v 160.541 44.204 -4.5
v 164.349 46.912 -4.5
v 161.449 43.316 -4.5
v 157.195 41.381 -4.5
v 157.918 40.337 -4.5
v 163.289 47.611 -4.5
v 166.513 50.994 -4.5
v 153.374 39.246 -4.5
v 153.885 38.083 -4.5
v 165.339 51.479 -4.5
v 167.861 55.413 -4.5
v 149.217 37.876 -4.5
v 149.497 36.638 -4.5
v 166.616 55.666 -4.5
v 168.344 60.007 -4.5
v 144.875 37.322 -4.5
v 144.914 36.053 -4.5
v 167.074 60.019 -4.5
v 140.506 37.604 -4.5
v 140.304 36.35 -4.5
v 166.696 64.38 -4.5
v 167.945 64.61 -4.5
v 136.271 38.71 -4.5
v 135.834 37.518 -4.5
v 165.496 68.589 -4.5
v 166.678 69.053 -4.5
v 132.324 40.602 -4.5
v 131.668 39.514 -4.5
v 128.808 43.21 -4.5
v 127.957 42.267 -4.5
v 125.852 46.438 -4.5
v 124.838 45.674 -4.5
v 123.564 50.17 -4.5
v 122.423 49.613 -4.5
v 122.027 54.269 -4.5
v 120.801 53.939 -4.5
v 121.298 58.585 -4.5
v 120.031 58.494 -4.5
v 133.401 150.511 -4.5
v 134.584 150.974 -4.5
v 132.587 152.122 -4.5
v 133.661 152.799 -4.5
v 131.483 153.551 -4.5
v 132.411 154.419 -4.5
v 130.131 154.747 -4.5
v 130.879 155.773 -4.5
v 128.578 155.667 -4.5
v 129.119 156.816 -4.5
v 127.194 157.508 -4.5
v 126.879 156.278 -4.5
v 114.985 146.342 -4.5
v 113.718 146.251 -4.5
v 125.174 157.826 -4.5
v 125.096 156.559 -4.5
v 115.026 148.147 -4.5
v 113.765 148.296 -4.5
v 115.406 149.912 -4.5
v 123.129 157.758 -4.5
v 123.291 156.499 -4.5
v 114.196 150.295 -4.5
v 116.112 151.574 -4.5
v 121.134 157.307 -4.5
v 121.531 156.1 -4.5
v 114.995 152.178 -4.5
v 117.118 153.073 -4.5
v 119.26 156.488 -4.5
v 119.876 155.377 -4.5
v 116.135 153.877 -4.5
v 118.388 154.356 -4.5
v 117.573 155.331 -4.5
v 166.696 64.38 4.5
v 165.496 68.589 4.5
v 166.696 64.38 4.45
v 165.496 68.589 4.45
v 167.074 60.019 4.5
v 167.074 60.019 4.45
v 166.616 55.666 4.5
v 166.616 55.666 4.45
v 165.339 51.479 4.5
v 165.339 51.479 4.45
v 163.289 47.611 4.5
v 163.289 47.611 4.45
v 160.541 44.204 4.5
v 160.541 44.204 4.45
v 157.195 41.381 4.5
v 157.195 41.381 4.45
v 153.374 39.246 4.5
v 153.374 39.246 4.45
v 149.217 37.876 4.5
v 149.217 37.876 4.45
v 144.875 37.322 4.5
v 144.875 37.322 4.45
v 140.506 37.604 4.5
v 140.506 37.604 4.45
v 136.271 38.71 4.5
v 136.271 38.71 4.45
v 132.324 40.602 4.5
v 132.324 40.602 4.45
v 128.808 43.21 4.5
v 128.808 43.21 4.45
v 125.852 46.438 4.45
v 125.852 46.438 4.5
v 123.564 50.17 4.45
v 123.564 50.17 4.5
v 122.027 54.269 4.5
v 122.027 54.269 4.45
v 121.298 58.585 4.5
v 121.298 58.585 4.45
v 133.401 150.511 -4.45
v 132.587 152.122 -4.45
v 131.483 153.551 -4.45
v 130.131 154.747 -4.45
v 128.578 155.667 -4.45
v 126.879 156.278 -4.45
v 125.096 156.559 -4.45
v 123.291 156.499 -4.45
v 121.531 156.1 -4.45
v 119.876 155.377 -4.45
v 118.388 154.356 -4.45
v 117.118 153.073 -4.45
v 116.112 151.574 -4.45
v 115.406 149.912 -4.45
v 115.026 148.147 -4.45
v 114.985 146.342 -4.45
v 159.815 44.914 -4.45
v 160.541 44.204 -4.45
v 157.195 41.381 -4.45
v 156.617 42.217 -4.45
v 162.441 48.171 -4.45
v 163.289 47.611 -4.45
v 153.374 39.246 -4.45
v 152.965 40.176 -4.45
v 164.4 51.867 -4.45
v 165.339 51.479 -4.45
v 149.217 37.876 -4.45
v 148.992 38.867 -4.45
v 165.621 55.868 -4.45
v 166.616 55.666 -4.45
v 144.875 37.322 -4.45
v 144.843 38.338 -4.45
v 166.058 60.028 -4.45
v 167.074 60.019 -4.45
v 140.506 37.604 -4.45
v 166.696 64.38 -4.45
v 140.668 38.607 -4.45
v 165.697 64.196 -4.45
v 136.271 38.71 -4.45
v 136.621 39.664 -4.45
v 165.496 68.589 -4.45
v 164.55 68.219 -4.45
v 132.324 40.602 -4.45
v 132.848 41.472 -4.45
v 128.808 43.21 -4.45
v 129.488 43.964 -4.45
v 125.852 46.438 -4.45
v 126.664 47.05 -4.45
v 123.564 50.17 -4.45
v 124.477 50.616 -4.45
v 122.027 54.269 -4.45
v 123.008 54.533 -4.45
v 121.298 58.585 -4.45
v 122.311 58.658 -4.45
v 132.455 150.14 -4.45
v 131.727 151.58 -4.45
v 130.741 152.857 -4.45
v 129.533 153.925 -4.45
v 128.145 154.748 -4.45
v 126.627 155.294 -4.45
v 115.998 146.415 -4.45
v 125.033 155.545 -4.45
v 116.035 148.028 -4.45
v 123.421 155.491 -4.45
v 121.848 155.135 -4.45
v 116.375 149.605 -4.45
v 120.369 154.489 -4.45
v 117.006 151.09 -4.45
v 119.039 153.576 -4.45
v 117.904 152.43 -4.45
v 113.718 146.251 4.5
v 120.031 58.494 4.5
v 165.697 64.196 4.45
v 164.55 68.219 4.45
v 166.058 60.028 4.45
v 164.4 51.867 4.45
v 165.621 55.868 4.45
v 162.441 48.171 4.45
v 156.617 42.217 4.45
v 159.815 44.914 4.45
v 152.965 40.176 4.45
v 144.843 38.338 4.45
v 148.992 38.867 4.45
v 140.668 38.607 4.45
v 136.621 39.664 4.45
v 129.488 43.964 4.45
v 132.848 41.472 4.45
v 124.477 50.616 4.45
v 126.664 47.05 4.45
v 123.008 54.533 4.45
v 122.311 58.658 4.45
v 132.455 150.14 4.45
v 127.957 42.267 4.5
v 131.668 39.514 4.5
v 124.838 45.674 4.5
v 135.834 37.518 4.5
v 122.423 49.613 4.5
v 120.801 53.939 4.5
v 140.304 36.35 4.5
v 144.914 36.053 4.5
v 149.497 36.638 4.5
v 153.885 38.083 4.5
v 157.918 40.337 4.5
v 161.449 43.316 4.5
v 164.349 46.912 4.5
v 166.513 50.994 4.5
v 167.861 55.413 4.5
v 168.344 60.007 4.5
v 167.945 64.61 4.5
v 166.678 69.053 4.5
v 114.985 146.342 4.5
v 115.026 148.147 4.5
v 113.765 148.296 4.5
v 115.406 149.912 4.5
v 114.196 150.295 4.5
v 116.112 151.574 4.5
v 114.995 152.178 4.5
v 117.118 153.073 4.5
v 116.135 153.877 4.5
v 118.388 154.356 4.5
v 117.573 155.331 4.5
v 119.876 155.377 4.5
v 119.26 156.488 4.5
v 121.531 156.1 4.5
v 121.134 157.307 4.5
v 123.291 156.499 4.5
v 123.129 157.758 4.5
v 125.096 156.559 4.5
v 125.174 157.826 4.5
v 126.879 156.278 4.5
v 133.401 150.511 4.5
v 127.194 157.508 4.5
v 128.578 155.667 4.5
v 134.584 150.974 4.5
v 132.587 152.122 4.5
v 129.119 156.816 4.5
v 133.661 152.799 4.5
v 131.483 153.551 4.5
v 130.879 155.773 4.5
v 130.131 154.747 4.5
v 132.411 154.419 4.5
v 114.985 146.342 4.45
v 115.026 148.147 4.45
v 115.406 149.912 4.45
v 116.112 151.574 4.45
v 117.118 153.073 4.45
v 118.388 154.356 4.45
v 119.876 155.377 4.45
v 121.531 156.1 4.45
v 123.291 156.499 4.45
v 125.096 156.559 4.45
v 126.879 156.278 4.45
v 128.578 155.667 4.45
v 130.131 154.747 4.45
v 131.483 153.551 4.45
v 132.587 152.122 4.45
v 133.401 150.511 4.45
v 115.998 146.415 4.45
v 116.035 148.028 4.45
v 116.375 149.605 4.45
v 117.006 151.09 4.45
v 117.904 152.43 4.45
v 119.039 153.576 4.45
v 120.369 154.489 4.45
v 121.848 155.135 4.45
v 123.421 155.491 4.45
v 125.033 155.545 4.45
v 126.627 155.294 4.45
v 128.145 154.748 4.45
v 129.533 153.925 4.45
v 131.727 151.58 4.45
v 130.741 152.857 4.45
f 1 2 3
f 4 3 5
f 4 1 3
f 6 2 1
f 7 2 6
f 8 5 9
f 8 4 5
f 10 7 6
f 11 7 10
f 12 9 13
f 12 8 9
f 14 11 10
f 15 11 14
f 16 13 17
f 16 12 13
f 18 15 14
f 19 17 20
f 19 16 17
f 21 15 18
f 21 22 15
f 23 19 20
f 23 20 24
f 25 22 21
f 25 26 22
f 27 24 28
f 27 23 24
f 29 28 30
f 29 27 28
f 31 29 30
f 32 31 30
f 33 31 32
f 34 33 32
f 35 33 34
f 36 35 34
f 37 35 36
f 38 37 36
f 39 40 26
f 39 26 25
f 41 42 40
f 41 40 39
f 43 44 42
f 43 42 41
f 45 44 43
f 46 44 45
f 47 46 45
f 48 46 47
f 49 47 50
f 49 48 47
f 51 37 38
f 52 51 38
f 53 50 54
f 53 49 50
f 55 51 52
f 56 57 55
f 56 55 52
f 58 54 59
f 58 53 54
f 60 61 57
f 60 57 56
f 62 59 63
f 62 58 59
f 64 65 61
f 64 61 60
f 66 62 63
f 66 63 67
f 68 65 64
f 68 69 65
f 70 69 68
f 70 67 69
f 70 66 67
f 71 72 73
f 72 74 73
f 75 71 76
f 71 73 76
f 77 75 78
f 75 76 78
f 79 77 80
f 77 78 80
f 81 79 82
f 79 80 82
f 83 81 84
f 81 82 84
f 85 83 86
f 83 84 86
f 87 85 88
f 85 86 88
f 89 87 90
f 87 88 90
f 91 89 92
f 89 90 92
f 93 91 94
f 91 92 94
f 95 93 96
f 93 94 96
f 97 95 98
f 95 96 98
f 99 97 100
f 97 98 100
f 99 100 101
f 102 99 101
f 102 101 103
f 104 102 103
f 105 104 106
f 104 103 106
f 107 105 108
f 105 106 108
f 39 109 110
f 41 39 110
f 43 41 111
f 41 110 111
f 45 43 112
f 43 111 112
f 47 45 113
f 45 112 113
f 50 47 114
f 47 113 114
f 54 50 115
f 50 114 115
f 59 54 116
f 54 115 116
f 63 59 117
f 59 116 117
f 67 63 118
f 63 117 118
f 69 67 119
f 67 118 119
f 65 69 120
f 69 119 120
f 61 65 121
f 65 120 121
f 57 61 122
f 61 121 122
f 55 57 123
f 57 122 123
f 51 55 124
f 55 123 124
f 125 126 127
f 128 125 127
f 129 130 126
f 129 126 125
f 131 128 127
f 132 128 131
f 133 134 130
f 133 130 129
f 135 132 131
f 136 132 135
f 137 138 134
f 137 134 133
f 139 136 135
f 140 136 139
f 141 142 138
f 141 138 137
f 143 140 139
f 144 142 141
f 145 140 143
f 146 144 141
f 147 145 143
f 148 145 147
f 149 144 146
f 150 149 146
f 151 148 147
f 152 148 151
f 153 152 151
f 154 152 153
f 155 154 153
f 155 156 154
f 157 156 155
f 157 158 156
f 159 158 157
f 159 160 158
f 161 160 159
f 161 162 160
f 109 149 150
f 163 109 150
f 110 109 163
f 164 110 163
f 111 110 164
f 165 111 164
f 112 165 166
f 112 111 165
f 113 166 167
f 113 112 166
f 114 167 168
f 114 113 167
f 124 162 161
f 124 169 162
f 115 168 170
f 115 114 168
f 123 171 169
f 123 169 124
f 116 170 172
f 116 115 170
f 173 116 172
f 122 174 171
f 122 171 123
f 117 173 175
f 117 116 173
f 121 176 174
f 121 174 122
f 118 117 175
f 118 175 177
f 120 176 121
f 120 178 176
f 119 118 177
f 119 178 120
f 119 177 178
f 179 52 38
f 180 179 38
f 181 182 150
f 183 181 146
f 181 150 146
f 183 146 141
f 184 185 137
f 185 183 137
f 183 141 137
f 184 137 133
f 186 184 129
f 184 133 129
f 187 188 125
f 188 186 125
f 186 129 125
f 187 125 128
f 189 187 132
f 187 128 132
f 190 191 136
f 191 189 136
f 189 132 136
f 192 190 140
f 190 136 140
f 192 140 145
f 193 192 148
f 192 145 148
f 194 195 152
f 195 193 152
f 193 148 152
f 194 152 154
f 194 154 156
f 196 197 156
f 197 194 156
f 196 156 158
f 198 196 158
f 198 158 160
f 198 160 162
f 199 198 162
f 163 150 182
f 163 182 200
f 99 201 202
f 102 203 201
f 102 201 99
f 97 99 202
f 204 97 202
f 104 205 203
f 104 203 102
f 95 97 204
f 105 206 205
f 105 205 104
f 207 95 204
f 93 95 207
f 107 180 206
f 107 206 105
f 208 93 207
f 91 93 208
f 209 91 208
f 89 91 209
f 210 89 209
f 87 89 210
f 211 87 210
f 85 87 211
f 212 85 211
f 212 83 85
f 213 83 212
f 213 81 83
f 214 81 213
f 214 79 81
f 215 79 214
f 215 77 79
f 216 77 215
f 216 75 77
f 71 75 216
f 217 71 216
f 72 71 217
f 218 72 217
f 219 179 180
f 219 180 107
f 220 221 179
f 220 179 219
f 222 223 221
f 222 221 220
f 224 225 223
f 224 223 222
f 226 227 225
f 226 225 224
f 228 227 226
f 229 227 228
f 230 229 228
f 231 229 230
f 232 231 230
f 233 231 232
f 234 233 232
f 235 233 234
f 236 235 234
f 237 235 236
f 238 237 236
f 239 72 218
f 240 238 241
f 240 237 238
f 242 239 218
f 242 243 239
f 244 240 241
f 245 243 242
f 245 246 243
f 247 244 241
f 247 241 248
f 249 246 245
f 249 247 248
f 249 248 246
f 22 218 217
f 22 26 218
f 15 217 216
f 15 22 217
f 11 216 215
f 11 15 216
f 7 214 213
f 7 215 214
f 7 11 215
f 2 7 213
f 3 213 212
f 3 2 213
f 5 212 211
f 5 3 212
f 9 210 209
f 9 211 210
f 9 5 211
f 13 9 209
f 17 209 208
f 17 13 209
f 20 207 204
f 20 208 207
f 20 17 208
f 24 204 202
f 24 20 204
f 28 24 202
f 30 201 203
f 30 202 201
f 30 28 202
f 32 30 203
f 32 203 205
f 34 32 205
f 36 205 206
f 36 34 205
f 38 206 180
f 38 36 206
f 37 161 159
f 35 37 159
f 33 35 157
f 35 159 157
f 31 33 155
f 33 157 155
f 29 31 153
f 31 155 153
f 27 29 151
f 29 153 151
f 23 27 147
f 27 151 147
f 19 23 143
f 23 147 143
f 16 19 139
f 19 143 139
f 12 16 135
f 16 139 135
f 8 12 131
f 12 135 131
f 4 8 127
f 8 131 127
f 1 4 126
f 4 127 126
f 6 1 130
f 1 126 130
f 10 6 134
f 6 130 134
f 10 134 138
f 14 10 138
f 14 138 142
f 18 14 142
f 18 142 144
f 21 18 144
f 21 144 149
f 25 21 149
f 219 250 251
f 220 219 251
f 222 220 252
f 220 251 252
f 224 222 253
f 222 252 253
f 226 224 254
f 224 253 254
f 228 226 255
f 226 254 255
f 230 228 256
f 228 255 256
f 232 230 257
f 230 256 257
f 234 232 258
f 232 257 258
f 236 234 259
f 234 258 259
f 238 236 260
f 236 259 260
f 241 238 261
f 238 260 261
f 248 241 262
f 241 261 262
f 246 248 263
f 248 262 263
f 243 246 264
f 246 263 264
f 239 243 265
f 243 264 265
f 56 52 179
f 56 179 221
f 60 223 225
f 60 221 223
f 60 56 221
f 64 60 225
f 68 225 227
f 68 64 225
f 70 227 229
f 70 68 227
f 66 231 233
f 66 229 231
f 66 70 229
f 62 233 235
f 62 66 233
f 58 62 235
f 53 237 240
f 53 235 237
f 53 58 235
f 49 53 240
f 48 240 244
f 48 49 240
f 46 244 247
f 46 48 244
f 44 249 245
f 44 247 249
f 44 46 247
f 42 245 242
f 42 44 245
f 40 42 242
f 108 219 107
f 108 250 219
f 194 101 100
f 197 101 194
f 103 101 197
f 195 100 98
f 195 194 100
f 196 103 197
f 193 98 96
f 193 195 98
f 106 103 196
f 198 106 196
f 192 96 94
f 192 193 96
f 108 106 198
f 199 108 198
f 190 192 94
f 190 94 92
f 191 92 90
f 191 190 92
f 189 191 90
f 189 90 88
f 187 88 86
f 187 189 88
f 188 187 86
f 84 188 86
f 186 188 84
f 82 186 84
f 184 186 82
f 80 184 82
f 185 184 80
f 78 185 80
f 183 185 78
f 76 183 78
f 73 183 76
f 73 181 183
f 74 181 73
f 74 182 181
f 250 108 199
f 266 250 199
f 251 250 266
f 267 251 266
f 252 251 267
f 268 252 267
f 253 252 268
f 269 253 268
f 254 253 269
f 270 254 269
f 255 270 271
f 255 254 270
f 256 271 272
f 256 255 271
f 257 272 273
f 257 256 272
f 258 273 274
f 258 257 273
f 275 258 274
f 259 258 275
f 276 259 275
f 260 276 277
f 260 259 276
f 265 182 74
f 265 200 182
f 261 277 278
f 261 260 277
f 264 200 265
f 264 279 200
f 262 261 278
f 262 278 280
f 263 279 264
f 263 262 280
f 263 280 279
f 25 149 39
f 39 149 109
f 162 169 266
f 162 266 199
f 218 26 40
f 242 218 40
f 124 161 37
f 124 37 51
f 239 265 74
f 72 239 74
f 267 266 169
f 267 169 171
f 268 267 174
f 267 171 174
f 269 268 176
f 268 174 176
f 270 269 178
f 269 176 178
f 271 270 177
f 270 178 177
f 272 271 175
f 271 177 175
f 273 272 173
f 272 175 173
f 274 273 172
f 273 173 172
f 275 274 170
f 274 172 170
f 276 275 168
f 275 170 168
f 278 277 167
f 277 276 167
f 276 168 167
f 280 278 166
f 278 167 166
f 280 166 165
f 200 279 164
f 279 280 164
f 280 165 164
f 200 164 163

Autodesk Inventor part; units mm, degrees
ref_plane "YZ Plane" through (0, 0, 0) normal (1, 0, 0) x (0, 1, 0)
ref_plane "XZ Plane" through (0, 0, 0) normal (0, 1, 0) x (-1, 0, 0)
ref_plane "XY Plane" through (0, 0, 0) normal (0, 0, 1) x (1, 0, 0)
sketch "Main Outline" plane through (0, 0, 0) normal (0, 0, 1) x (1, 0, 0)
  line L0 (0, 0) -> (304.8, 0) construction
  line L1 (304.8, 0) -> (304.8, 50.8) construction
  line L2 (304.8, 50.8) -> (0, 50.8) construction
  line L3 (0, 50.8) -> (0, 0) construction
  line L4 (0, 50.8) -> (0, 53.34) construction
  line L5 (0, 53.34) -> (304.8, 53.34) construction
  line L6 (304.8, 53.34) -> (304.8, 50.8) construction
  circle A0 centre (152.4, 23.8125) radius 17.4625 construction
  line L7 (152.4, 23.8125) -> (152.4, 0) construction
  circle A1 centre (152.4, 23.8125) radius 27.94 construction
  circle A2 centre (152.4, 23.8125) radius 21.59 construction
  line L8 (152.4, 23.8125) -> (144.1569, 60.2292) construction
  circle A3 centre (144.1569, 60.2292) radius 15.24 construction
  circle A4 centre (144.1569, 60.2292) radius 8.89 construction
  circle A5 centre (144.1569, 60.2292) radius 14.2875 construction
  arc A6 (163.8162, 72.0089) -> (128.198, 43.7805) centre (144.1569, 60.2292) ccw construction
  circle A7 centre (98.8106, 85.598) radius 32.258 construction
  circle A8 centre (124.5097, 147.0273) radius 32.258 construction
  circle A9 centre (174.158, 102.6533) radius 32.258 construction
  circle A10 centre (144.1569, 60.2292) radius 11.1125 construction
  circle A11 centre (152.4, 23.8125) radius 49.53 construction
  line L9 (144.1569, 60.2292) -> (124.5097, 147.0273) construction
  line L10 (144.1569, 60.2292) -> (98.8106, 85.598) construction
  line L11 (98.8106, 85.598) -> (174.158, 102.6533) construction
  line L12 (174.158, 102.6533) -> (144.1569, 60.2292) construction
  circle A12 centre (98.8106, 85.598) radius 9.5493 construction
  arc A13 (172.0498, 111.9669) -> (183.1109, 99.3313) centre (174.158, 102.6533) ccw construction
  circle A14 centre (124.5097, 147.0273) radius 9.5493 construction
  line L13 (96.7024, 94.9117) -> (172.0498, 111.9669) construction
  line L14 (183.1109, 99.3313) -> (165.6438, 52.2565) construction
  line L15 (92.161, 78.7444) -> (128.198, 43.7805) construction
  line L16 (172.0498, 111.9669) -> (174.158, 102.6533) construction
  line L17 (174.158, 102.6533) -> (183.1109, 99.3313) construction
  arc A15 (183.1109, 99.3313) -> (172.0498, 111.9669) centre (174.158, 102.6533) ccw construction
  arc A16 (165.6438, 52.2565) -> (163.8162, 72.0089) centre (144.1569, 60.2292) ccw construction
  arc A17 (128.198, 43.7805) -> (165.6438, 52.2565) centre (144.1569, 60.2292) ccw construction
  circle A18 centre (124.4396, 147.337) radius 32.258 construction
  circle A19 centre (124.3695, 147.6466) radius 32.258 construction
  circle A20 centre (124.2994, 147.9563) radius 32.258 construction
  line L18 (124.5097, 147.0273) -> (124.2994, 147.9563) construction
  circle A21 centre (124.5798, 146.7176) radius 32.258 construction
  circle A22 centre (117.4622, 43.2997) radius 9.525 construction
  circle A23 centre (175.54, 56.4459) radius 9.525 construction
  line L19 (152.4, 23.8125) -> (117.4622, 43.2997) construction
  line L20 (152.4, 23.8125) -> (175.54, 56.4459) construction
  line L21 (117.4622, 43.2997) -> (98.8106, 85.598) construction
  line L22 (175.54, 56.4459) -> (174.158, 102.6533) construction
  circle A24 centre (133.7342, 106.2753) radius 7.9375 construction
  line L23 (133.401, 150.5107) -> (165.496, 68.5894) construction
  circle A25 centre (152.4, 23.8125) radius 29.845 construction
  line L24 (114.985, 146.3422) -> (121.2977, 58.5849) construction
  circle A26 centre (99.0876, 85.443) radius 32.258 construction
  circle A27 centre (97.9793, 86.063) radius 32.258 construction
  line L25 (97.9793, 86.063) -> (98.8106, 85.598) construction
  circle A28 centre (98.2564, 85.908) radius 32.258 construction
  circle A29 centre (98.5335, 85.753) radius 32.258 construction
  circle A30 centre (152.4, 23.8125) radius 29.845 construction
  circle A31 centre (122.555, 23.8125) radius 6.35 construction
  circle A32 centre (179.3358, 36.6651) radius 6.35 construction
  line L26 (122.555, 23.8125) -> (152.4, 23.8125) construction
  line L27 (152.4, 23.8125) -> (182.245, 23.8125) construction
  circle A33 centre (182.245, 23.8125) radius 6.35 construction
  circle A34 centre (125.4642, 10.9599) radius 6.35 construction
  circle A35 centre (150.1885, 33.5827) radius 39.8623 construction
  line L28 (72.8944, 65.7819) -> (119.1902, 8.5205) construction
  circle A36 centre (174.708, 103.431) radius 32.258 construction
  line L29 (174.158, 102.6533) -> (174.708, 103.431) construction
  circle A37 centre (174.5246, 103.1717) radius 32.258 construction
  circle A38 centre (174.3413, 102.9125) radius 32.258 construction
  circle A39 centre (173.9747, 102.394) radius 32.258 construction
  line L30 (188.958, 24.3128) -> (206.0816, 95.9295) construction
  circle A40 centre (133.7342, 106.2753) radius 8.1693 construction
  arc A41 (85.4541, 115.7901) -> (94.2274, 135.7949) centre (79.2901, 130.4196) ccw construction
  arc A42 (156.6774, 149.9308) -> (173.2104, 135.6542) centre (172.4734, 151.5121) ccw construction
  line L31 (124.2994, 147.9563) -> (124.8602, 145.479) construction
  line L32 (114.3901, 145.7133) -> (114.9509, 143.236) construction
  line L33 (134.7695, 147.722) -> (134.2088, 150.1993) construction
  arc A43 (134.2088, 150.1993) -> (114.3901, 145.7133) centre (124.2994, 147.9563) ccw construction
  arc A44 (114.9509, 143.236) -> (134.7695, 147.722) centre (124.8602, 145.479) ccw construction
  line L34 (174.708, 103.431) -> (173.2414, 101.3571) construction
  line L35 (166.4126, 109.2972) -> (164.9461, 107.2234) construction
  line L36 (181.5368, 95.4909) -> (183.0033, 97.5647) construction
  arc A45 (183.0033, 97.5647) -> (166.4126, 109.2972) centre (174.708, 103.431) ccw construction
  arc A46 (164.9461, 107.2234) -> (181.5368, 95.4909) centre (173.2414, 101.3571) ccw construction
  line L37 (97.9793, 86.063) -> (100.196, 84.8229) construction
  line L38 (93.0188, 77.1963) -> (95.2355, 75.9562) construction
  line L39 (105.1564, 93.6897) -> (102.9398, 94.9298) construction
  arc A47 (102.9398, 94.9298) -> (93.0188, 77.1963) centre (97.9793, 86.063) ccw construction
  arc A48 (95.2355, 75.9562) -> (105.1564, 93.6897) centre (100.196, 84.8229) ccw construction
  circle A49 centre (117.4622, 43.2997) radius 3.9687 construction
  circle A50 centre (175.54, 56.4459) radius 3.9687 construction
  line L40 (152.4, 23.8125) -> (158.9889, -5.2961) construction
  arc A51 (89.3511, 54.6895) -> (85.9237, 49.6664) centre (88.3927, 51.6626) ccw construction
  arc A52 (201.2624, 75.7739) -> (196.006, 78.8314) centre (198.1744, 76.5122) ccw construction
  circle A53 centre (152.4, 23.8125) radius 14.224 construction
  circle A54 centre (133.7342, 106.2753) radius 3.9687 construction
  circle A55 centre (156.886, 3.9939) radius 6.35 construction
  circle A56 centre (156.886, 3.9939) radius 2.0828 construction
  circle A57 centre (152.4, 23.8125) radius 20.32 construction
  line L41 (132.9935, 29.8368) -> (152.4, 23.8125) construction
  line L42 (152.4, 23.8125) -> (167.3204, 37.6068) construction
  circle A58 centre (167.3204, 37.6068) radius 2.0828 construction
  circle A59 centre (167.3204, 37.6068) radius 3.9687 construction
  circle A60 centre (132.9935, 29.8368) radius 2.0828 construction
  circle A61 centre (132.9935, 29.8368) radius 3.9688 construction
  point P0 (173.9747, 102.394)
  point P1 (99.0876, 85.443)
  dimension "d18" = 99.06
  dimension "d58" = 64.516
  dimension "d86" = 64.516
  dimension "d0" = 304.8
  dimension "d1" = 50.8
  dimension "d2" = 2.54
  dimension "d3" = 34.925
  dimension "d4" = 23.8125
  dimension "d5" = 152.4
  dimension "d6" = 55.88
  dimension "d7" = 43.18
  dimension "d8" = 37.338
  dimension "d10" = 30.48
  dimension "d11" = 17.78
  dimension "d12" = 28.575
  dimension "d13" = 45.8366
  dimension "d14" = 64.516
  dimension "d15" = 64.516
  dimension "d16" = 64.516
  dimension "d17" = 22.225
  dimension "d19" = 51.9602
  dimension "d20" = 88.9939
  dimension "d21" = 19.0986
  dimension "d22" = 19.0986
  dimension "d23" = 19.0986
  dimension "d30" = 123.112
  dimension "d40" = 64.516
  dimension "d41" = 64.516
  dimension "d42" = 64.516
  dimension "d43" = 0.9525
  dimension "d44" = 0.3175
  dimension "d45" = 0.635
  dimension "d46" = 64.516
  dimension "d47" = 0.3175
  dimension "d48" = 19.05
  dimension "d49" = 19.05
  dimension "d50" = 40.005
  dimension "d51" = 40.005
  dimension "d52" = 46.228
  dimension "d54" = 46.228
  dimension "d55" = 15.875
  dimension "d56" = 41.4655
  dimension "d57" = 59.69
  dimension "d59" = 64.516
  dimension "d60" = 64.516
  dimension "d61" = 64.516
  dimension "d62" = 0.3175
  dimension "d63" = 0.3175
  dimension "d64" = 0.635
  dimension "d65" = 0.9525
  dimension "d73" = 12.7
  dimension "d74" = 12.7
  dimension "d76" = 59.69
  dimension "d78" = 12.7
  dimension "d79" = 12.7
  dimension "d80" = 64.516
  dimension "d81" = 0.9525
  dimension "d82" = 64.516
  dimension "d83" = 64.516
  dimension "d84" = 0.3175
  dimension "d85" = 0.635
  dimension "d88" = 0.3175
  dimension "d89" = 31.75
  dimension "d90" = 31.75
  dimension "d94" = 1.5875
  dimension "d95" = 20.32
  dimension "d96" = 1.5875
sketch "Upper CIM C-C Check" plane through (0, 0, 0) normal (0, 0, 1) x (1, 0, 0)
  arc A0 (3.4429, -22.6582) -> (3.4429, 22.6582) centre (0, 0) ccw construction
  arc A1 (90.4285, 9.4409) -> (90.4285, -9.4409) centre (88.9939, 0) ccw construction
  line L0 (88.9939, 0) -> (0, 0) construction
  line L1 (90.4285, 9.4409) -> (3.4429, 22.6582)
  line L2 (3.4429, -22.6582) -> (90.4285, -9.4409)
  arc A2 (90.4285, -9.4409) -> (90.4285, 9.4409) centre (88.9939, 0) ccw
  arc A3 (3.4429, 22.6582) -> (3.4429, -22.6582) centre (0, 0) ccw
  dimension "d24" = 45.8366
  dimension "d25" = 19.0986
  dimension "d26" = 78.9119
  dimension "d27" = 87.984
  dimension "d28" = 27.12
  dimension "d29" = 88.9939
sketch "Sketch3" plane through (0, 0, 0) normal (0, 0, 1) x (1, 0, 0)
  line L0 (114.985, 146.3422) -> (121.2977, 58.5849) projected
  line L1 (133.401, 150.5107) -> (165.496, 68.5894) projected
  arc A0 (133.401, 150.5107) -> (114.985, 146.3422) centre (124.5097, 147.0273) ccw
  arc A1 (121.2977, 58.5849) -> (165.496, 68.5894) centre (144.1569, 60.2292) ccw
  line L2 (164.55, 68.2188) -> (132.455, 150.1401)
  arc A2 (132.455, 150.1401) -> (115.9984, 146.4151) centre (124.5097, 147.0273) ccw
  line L3 (115.9984, 146.4151) -> (122.311, 58.6578)
  arc A3 (122.311, 58.6578) -> (164.55, 68.2188) centre (144.1569, 60.2292) ccw
  line L4 (166.6785, 69.0527) -> (134.5835, 150.974)
  arc A4 (134.5835, 150.974) -> (113.7183, 146.2511) centre (124.5097, 147.0273) ccw
  line L5 (113.7183, 146.2511) -> (120.0309, 58.4938)
  arc A5 (120.0309, 58.4938) -> (166.6785, 69.0527) centre (144.1569, 60.2292) ccw
  point P0 (0, 0)
  dimension "d115" = 1.27
  dimension "d116" = 1.016
extrude "Extrusion1" add sketch "Sketch3" along normal blind 4.5 contours A5 L5 A4 L4
extrude "Extrusion2" add sketch "Sketch3" along normal blind 4.45 contours A0 L1 A1 L0
mirror "Mirror1" about plane through (136.0096, 96.2228, 0) normal (0, 0, -1)
equation "\"d3\" = r10"
equation "\"d6\" = g44"
equation "\"d7\" = g34"
equation "\"d10\" = g24"
equation "\"d11\" = g14"
equation "\"d12\" = r8"
equation "\"d13\" = p48"
equation "\"d14\" = cim"
equation "\"d15\" = cim"
equation "\"d16\" = cim"
equation "\"d17\" = r6"
equation "\"d21\" = p20"
equation "\"d22\" = p20"
equation "\"d23\" = p20"
equation "\"d24\" = p48"
equation "\"d25\" = p20"
equation "\"d29\" = d20"
equation "\"g14\" = 17.78"
equation "\"g24\" = 30.48"
equation "\"g34\" = 43.18"
equation "\"g44\" = 55.88"
equation "\"p20\" = 19.09859"
equation "\"p48\" = 45.83662"
equation "\"r10\" = 34.925"
equation "\"r9\" = 31.75"
equation "\"r8\" = 28.575"
equation "\"r7\" = 25.4"
equation "\"r6\" = 22.225"
equation "\"r5\" = 19.05"
equation "\"r4\" = 15.875"
equation "\"r3\" = 12.7"
equation "\"cim\" = 64.516"
equation "\"act\" = 28.448"
equation "\"actL\" = 23.749"
equation "\"UpperCimCCCheck\" = 2 * d27 + d26 + d28"
equation "\"LowerBeltPathCCCheck\" = 267"
properties material "Rubber"
